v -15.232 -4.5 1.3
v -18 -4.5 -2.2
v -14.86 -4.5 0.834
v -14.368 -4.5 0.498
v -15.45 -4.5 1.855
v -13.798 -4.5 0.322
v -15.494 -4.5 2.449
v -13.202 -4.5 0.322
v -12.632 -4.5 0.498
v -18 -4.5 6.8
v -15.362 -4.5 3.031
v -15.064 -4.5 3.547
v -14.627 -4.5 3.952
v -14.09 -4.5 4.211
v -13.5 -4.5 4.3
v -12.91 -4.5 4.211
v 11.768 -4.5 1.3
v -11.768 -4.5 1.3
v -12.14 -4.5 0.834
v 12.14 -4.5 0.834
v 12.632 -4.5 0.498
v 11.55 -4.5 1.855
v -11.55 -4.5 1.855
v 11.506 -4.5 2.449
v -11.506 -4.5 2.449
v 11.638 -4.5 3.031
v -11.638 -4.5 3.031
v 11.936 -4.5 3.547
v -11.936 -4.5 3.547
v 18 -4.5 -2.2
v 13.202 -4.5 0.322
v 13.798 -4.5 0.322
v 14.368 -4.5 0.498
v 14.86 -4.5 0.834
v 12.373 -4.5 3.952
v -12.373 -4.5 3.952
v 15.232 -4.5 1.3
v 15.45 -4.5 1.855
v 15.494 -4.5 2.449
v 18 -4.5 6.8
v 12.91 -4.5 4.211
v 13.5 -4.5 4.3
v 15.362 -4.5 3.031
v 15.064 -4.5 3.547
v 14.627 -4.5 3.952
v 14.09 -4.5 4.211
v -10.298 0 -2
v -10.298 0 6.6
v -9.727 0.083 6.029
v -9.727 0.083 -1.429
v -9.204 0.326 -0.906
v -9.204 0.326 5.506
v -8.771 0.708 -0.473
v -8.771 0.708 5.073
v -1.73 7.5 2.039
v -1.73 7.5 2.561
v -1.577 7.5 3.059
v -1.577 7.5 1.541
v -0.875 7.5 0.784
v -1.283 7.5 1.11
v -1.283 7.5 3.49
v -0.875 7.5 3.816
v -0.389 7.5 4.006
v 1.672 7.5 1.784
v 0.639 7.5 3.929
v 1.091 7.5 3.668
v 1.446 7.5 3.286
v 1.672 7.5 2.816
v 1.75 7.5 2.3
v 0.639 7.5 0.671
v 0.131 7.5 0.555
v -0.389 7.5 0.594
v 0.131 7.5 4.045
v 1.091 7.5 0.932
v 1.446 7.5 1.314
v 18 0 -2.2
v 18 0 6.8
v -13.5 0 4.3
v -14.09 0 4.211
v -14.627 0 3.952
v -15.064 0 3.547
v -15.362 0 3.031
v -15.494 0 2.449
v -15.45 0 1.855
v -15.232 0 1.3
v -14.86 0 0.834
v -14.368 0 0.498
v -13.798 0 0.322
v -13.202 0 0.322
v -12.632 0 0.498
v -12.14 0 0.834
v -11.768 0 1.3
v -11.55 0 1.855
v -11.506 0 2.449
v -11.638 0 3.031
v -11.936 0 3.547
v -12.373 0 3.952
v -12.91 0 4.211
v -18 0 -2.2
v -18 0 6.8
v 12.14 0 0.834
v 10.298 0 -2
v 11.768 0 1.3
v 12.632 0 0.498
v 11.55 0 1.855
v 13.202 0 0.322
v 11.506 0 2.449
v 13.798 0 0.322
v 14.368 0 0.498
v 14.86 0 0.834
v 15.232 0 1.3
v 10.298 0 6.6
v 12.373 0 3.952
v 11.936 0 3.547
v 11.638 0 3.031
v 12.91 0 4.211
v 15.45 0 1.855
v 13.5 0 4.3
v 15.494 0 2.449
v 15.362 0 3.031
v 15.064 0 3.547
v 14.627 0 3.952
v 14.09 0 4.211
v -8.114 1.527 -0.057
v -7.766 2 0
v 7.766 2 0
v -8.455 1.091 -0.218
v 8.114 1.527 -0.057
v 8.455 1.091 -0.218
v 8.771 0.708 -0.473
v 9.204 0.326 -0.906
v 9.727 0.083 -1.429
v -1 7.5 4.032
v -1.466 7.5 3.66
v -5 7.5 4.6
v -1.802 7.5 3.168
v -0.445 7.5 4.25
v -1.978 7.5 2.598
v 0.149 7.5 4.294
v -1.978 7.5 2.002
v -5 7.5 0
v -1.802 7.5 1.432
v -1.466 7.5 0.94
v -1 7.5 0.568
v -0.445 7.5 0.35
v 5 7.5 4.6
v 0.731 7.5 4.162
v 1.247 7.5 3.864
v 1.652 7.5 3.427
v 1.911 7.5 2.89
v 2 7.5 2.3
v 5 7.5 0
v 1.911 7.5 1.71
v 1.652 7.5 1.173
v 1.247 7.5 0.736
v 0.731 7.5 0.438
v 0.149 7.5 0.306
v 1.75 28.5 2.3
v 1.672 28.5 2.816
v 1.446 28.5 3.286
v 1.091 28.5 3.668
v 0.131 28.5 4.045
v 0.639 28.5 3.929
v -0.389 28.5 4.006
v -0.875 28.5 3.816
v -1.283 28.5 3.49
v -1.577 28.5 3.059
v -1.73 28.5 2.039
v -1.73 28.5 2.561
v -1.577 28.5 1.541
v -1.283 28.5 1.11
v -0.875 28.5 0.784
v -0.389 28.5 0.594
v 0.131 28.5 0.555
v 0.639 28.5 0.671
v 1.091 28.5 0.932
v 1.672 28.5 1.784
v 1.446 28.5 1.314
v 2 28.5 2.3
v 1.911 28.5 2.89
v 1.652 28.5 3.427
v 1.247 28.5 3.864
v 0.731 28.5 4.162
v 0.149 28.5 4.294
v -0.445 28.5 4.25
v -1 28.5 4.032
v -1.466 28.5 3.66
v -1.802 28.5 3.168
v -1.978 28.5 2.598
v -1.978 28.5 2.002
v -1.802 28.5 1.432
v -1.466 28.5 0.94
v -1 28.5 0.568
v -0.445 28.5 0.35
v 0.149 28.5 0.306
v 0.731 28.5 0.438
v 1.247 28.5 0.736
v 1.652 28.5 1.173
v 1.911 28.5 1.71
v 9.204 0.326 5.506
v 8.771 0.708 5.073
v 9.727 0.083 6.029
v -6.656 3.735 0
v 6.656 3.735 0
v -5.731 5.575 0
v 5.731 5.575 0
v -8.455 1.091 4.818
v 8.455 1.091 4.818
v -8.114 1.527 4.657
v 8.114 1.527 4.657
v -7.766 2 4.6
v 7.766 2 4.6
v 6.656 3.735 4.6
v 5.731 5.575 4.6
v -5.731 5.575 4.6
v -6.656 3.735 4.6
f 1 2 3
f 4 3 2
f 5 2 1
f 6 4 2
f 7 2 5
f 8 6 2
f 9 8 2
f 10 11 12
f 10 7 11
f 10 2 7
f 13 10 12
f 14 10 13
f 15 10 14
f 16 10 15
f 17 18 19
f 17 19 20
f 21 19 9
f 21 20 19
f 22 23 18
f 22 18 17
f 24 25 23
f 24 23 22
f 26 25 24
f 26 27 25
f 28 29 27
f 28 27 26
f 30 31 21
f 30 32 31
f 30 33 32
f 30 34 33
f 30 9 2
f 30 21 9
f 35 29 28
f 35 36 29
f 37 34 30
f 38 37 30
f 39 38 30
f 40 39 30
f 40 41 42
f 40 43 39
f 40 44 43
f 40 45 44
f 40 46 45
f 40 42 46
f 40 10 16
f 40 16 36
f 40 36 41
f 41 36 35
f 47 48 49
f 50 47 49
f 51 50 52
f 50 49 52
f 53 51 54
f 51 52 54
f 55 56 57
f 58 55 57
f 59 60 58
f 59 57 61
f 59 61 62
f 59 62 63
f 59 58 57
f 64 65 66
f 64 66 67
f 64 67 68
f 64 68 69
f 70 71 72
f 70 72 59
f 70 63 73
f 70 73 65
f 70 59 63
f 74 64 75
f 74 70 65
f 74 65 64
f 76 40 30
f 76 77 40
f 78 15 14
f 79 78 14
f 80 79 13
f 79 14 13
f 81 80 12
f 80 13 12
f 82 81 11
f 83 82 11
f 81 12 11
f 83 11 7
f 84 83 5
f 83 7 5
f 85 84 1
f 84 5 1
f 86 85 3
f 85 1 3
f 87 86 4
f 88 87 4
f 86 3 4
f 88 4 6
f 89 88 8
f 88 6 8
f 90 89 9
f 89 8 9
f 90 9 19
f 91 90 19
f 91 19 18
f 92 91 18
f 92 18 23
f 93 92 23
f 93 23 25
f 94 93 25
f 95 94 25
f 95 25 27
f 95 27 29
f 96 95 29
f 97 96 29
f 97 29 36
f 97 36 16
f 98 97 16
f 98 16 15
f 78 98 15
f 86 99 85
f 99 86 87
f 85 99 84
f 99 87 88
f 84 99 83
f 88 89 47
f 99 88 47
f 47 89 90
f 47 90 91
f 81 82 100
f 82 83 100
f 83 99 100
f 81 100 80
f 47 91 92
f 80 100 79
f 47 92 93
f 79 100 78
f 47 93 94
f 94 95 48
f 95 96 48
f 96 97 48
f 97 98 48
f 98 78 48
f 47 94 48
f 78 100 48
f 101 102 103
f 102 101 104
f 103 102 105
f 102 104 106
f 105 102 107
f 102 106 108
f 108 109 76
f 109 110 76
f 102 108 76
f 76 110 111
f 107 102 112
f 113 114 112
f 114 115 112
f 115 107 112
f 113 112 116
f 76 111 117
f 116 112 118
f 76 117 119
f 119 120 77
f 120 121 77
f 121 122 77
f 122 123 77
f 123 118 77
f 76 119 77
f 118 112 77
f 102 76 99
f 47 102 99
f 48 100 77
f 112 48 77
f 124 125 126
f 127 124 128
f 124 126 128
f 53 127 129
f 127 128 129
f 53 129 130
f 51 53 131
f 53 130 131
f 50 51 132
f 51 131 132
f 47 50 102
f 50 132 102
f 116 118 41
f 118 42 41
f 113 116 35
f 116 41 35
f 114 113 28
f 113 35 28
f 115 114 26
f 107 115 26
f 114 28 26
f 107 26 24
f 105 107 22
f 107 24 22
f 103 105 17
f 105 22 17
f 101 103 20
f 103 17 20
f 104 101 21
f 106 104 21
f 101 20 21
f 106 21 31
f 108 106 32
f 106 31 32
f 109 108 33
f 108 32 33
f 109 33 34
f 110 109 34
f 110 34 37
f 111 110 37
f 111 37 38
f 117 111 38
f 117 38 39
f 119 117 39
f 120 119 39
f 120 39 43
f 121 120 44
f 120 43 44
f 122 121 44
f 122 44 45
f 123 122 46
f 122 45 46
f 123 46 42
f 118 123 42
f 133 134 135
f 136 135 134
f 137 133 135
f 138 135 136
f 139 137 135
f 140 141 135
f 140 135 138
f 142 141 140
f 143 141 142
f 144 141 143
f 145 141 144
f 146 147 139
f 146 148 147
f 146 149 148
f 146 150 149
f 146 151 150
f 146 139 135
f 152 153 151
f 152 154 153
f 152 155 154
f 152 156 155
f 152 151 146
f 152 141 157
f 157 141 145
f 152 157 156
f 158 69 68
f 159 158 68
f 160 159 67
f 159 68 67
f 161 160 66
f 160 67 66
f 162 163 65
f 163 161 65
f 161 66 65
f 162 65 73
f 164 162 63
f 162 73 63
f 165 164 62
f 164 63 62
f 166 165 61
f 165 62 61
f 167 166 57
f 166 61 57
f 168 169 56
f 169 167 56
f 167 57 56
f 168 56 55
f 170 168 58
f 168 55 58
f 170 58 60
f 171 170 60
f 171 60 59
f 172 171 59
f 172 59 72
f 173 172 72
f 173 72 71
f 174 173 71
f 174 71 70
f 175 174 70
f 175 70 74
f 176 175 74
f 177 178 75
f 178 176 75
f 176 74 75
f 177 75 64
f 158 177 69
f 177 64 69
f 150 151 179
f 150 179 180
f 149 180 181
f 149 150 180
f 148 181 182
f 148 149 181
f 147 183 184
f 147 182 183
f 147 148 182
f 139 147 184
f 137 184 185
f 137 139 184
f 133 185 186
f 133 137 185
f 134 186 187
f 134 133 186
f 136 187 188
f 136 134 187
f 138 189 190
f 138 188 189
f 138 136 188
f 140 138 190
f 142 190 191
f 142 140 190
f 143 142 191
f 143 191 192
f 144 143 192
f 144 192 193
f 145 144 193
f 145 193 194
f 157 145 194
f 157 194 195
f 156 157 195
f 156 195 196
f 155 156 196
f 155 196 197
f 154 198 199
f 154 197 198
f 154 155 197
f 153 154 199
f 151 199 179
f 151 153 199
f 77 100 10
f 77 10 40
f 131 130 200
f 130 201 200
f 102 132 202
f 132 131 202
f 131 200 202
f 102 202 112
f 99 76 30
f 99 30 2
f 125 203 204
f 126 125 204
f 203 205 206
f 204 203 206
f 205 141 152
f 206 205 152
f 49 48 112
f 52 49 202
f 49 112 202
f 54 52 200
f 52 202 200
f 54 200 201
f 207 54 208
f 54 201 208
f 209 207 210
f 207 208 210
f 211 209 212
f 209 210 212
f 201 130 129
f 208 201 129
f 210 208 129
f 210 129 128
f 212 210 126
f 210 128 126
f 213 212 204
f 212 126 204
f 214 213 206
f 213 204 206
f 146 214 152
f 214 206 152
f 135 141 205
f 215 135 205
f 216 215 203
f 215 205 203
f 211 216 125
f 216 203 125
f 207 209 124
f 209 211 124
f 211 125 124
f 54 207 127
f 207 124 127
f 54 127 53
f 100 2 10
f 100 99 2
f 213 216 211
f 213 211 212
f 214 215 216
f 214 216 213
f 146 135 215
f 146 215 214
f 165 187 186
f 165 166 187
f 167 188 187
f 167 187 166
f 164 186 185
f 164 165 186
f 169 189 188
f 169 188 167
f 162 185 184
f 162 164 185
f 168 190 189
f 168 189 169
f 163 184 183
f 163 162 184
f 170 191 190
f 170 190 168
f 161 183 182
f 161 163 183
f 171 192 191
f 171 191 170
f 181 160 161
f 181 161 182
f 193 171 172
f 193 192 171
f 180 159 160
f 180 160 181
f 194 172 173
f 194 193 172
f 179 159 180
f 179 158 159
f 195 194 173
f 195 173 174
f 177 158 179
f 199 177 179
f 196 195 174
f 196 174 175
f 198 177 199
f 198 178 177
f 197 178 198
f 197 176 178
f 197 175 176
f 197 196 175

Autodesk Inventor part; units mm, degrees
ref_plane "YZ Plane" through (0, 0, 0) normal (1, 0, 0) x (0, 1, 0)
ref_plane "XZ Plane" through (0, 0, 0) normal (0, 1, 0) x (-1, 0, 0)
ref_plane "XY Plane" through (0, 0, 0) normal (0, 0, 1) x (1, 0, 0)
sketch "Sketch1" plane through (0, 0, 0) normal (0, 0, 1) x (1, 0, 0)
  line L0 (0, 114) -> (0, -114) construction
  line L1 (-9.4, 0) -> (9.4, 0)
  line L2 (-5, 7.5) -> (5, 7.5)
  arc A0 (-9.4, 0) -> (-5, 7.5) centre (-24.038, 13.6283) ccw
  arc A1 (5, 7.5) -> (9.4, 0) centre (24.038, 13.6283) ccw
  point P0 (0, 0)
  point P1 (0, 0)
  point P2 (0, 7.5)
  dimension "d9" = 18.8
  dimension "d10" = 10
  dimension "d11" = 7.5
  dimension "d13" = 20
extrude "Extrusion1" add sketch "Sketch1" along normal blind 4.6
sketch "Sketch2" plane through (-9.4, 0, 0) normal (0, -1, 0) x (1, 0, 0)
  line L0 (-8.6, 6.8) -> (27.4, 6.8)
  line L1 (27.4, 6.8) -> (27.4, -2.2)
  line L2 (27.4, -2.2) -> (-8.6, -2.2)
  line L3 (-8.6, -2.2) -> (-8.6, 6.8)
  line L4 (0, 4.6) -> (18.8, 4.6) projected
  line L5 (0, 0) -> (18.8, 0) projected
  line L6 (0, 0) -> (0, 4.6) projected
  line L7 (18.8, 0) -> (18.8, 4.6) projected
  point P0 (9.4, 0)
  point P1 (0, 2.3)
  dimension "d16" = 36
  dimension "d17" = 9
  dimension "d18" = 2.2
  dimension "d19" = 2.2
  dimension "d20" = 8.6
  dimension "d21" = 8.6
extrude "Extrusion2" add sketch "Sketch2" along normal blind 4.5 contours L0 L1 L2 L3 | L4 L7 L5 L6
fillet "Fillet1" radius 2 4 edges at (0, 0, 4.6) (9.4, 0, 2.3) (0, 0, 0) (-9.4, 0, 2.3)
sketch "Sketch3" plane through (-5, 7.5, 0) normal (0, 1, 0) x (1, 0, 0)
  circle A0 centre (5, -2.3) radius 2
  circle A1 centre (5, -2.3) radius 1.75
  line L0 (10, -4.6) -> (0, -4.6) projected
  line L1 (10, 0) -> (0, 0) projected
  line L2 (0, 0) -> (0, -4.6) projected
  point P0 (5, 0)
  dimension "d25" = 4
  dimension "d26" = 3.5
  dimension "d27" = 2.3
  dimension "d28" = 2.3
  dimension "d29" = 5
extrude "Extrusion3" add sketch "Sketch3" along normal blind 21
sketch "Sketch4" plane through (-9.4, 0, 0) normal (0, 1, 0) x (1, 0, 0)
  circle A0 centre (-4.1, -2.3) radius 2
  circle A1 centre (22.9, -2.3) radius 2
  line L0 (-8.6, 2.2) -> (27.4, 2.2) projected
  circle A2 centre (9.4, -2.3) radius 1.75 projected
  circle A3 centre (9.4, -2.3) radius 2 projected
  circle A4 centre (9.4, -2.3) radius 1.75 projected
  circle A5 centre (9.4, -2.3) radius 1.75
  point P0 (9.4, 0)
  dimension "d32" = 4
  dimension "d33" = 4
  dimension "d34" = 4.5
  dimension "d35" = 4.5
  dimension "d36" = 3.5
  dimension "d37" = 13.5
  dimension "d38" = 13.5
hole "Hole1" at (-13.5, 0, 2.3) at (13.5, 0, 2.3) direction (0, -1, 0) diameter 4 end through all
equation "\"d38\" = d37"
properties part number "HUDSON-1-12 LEAFSPING SOLID EQUALISER"
